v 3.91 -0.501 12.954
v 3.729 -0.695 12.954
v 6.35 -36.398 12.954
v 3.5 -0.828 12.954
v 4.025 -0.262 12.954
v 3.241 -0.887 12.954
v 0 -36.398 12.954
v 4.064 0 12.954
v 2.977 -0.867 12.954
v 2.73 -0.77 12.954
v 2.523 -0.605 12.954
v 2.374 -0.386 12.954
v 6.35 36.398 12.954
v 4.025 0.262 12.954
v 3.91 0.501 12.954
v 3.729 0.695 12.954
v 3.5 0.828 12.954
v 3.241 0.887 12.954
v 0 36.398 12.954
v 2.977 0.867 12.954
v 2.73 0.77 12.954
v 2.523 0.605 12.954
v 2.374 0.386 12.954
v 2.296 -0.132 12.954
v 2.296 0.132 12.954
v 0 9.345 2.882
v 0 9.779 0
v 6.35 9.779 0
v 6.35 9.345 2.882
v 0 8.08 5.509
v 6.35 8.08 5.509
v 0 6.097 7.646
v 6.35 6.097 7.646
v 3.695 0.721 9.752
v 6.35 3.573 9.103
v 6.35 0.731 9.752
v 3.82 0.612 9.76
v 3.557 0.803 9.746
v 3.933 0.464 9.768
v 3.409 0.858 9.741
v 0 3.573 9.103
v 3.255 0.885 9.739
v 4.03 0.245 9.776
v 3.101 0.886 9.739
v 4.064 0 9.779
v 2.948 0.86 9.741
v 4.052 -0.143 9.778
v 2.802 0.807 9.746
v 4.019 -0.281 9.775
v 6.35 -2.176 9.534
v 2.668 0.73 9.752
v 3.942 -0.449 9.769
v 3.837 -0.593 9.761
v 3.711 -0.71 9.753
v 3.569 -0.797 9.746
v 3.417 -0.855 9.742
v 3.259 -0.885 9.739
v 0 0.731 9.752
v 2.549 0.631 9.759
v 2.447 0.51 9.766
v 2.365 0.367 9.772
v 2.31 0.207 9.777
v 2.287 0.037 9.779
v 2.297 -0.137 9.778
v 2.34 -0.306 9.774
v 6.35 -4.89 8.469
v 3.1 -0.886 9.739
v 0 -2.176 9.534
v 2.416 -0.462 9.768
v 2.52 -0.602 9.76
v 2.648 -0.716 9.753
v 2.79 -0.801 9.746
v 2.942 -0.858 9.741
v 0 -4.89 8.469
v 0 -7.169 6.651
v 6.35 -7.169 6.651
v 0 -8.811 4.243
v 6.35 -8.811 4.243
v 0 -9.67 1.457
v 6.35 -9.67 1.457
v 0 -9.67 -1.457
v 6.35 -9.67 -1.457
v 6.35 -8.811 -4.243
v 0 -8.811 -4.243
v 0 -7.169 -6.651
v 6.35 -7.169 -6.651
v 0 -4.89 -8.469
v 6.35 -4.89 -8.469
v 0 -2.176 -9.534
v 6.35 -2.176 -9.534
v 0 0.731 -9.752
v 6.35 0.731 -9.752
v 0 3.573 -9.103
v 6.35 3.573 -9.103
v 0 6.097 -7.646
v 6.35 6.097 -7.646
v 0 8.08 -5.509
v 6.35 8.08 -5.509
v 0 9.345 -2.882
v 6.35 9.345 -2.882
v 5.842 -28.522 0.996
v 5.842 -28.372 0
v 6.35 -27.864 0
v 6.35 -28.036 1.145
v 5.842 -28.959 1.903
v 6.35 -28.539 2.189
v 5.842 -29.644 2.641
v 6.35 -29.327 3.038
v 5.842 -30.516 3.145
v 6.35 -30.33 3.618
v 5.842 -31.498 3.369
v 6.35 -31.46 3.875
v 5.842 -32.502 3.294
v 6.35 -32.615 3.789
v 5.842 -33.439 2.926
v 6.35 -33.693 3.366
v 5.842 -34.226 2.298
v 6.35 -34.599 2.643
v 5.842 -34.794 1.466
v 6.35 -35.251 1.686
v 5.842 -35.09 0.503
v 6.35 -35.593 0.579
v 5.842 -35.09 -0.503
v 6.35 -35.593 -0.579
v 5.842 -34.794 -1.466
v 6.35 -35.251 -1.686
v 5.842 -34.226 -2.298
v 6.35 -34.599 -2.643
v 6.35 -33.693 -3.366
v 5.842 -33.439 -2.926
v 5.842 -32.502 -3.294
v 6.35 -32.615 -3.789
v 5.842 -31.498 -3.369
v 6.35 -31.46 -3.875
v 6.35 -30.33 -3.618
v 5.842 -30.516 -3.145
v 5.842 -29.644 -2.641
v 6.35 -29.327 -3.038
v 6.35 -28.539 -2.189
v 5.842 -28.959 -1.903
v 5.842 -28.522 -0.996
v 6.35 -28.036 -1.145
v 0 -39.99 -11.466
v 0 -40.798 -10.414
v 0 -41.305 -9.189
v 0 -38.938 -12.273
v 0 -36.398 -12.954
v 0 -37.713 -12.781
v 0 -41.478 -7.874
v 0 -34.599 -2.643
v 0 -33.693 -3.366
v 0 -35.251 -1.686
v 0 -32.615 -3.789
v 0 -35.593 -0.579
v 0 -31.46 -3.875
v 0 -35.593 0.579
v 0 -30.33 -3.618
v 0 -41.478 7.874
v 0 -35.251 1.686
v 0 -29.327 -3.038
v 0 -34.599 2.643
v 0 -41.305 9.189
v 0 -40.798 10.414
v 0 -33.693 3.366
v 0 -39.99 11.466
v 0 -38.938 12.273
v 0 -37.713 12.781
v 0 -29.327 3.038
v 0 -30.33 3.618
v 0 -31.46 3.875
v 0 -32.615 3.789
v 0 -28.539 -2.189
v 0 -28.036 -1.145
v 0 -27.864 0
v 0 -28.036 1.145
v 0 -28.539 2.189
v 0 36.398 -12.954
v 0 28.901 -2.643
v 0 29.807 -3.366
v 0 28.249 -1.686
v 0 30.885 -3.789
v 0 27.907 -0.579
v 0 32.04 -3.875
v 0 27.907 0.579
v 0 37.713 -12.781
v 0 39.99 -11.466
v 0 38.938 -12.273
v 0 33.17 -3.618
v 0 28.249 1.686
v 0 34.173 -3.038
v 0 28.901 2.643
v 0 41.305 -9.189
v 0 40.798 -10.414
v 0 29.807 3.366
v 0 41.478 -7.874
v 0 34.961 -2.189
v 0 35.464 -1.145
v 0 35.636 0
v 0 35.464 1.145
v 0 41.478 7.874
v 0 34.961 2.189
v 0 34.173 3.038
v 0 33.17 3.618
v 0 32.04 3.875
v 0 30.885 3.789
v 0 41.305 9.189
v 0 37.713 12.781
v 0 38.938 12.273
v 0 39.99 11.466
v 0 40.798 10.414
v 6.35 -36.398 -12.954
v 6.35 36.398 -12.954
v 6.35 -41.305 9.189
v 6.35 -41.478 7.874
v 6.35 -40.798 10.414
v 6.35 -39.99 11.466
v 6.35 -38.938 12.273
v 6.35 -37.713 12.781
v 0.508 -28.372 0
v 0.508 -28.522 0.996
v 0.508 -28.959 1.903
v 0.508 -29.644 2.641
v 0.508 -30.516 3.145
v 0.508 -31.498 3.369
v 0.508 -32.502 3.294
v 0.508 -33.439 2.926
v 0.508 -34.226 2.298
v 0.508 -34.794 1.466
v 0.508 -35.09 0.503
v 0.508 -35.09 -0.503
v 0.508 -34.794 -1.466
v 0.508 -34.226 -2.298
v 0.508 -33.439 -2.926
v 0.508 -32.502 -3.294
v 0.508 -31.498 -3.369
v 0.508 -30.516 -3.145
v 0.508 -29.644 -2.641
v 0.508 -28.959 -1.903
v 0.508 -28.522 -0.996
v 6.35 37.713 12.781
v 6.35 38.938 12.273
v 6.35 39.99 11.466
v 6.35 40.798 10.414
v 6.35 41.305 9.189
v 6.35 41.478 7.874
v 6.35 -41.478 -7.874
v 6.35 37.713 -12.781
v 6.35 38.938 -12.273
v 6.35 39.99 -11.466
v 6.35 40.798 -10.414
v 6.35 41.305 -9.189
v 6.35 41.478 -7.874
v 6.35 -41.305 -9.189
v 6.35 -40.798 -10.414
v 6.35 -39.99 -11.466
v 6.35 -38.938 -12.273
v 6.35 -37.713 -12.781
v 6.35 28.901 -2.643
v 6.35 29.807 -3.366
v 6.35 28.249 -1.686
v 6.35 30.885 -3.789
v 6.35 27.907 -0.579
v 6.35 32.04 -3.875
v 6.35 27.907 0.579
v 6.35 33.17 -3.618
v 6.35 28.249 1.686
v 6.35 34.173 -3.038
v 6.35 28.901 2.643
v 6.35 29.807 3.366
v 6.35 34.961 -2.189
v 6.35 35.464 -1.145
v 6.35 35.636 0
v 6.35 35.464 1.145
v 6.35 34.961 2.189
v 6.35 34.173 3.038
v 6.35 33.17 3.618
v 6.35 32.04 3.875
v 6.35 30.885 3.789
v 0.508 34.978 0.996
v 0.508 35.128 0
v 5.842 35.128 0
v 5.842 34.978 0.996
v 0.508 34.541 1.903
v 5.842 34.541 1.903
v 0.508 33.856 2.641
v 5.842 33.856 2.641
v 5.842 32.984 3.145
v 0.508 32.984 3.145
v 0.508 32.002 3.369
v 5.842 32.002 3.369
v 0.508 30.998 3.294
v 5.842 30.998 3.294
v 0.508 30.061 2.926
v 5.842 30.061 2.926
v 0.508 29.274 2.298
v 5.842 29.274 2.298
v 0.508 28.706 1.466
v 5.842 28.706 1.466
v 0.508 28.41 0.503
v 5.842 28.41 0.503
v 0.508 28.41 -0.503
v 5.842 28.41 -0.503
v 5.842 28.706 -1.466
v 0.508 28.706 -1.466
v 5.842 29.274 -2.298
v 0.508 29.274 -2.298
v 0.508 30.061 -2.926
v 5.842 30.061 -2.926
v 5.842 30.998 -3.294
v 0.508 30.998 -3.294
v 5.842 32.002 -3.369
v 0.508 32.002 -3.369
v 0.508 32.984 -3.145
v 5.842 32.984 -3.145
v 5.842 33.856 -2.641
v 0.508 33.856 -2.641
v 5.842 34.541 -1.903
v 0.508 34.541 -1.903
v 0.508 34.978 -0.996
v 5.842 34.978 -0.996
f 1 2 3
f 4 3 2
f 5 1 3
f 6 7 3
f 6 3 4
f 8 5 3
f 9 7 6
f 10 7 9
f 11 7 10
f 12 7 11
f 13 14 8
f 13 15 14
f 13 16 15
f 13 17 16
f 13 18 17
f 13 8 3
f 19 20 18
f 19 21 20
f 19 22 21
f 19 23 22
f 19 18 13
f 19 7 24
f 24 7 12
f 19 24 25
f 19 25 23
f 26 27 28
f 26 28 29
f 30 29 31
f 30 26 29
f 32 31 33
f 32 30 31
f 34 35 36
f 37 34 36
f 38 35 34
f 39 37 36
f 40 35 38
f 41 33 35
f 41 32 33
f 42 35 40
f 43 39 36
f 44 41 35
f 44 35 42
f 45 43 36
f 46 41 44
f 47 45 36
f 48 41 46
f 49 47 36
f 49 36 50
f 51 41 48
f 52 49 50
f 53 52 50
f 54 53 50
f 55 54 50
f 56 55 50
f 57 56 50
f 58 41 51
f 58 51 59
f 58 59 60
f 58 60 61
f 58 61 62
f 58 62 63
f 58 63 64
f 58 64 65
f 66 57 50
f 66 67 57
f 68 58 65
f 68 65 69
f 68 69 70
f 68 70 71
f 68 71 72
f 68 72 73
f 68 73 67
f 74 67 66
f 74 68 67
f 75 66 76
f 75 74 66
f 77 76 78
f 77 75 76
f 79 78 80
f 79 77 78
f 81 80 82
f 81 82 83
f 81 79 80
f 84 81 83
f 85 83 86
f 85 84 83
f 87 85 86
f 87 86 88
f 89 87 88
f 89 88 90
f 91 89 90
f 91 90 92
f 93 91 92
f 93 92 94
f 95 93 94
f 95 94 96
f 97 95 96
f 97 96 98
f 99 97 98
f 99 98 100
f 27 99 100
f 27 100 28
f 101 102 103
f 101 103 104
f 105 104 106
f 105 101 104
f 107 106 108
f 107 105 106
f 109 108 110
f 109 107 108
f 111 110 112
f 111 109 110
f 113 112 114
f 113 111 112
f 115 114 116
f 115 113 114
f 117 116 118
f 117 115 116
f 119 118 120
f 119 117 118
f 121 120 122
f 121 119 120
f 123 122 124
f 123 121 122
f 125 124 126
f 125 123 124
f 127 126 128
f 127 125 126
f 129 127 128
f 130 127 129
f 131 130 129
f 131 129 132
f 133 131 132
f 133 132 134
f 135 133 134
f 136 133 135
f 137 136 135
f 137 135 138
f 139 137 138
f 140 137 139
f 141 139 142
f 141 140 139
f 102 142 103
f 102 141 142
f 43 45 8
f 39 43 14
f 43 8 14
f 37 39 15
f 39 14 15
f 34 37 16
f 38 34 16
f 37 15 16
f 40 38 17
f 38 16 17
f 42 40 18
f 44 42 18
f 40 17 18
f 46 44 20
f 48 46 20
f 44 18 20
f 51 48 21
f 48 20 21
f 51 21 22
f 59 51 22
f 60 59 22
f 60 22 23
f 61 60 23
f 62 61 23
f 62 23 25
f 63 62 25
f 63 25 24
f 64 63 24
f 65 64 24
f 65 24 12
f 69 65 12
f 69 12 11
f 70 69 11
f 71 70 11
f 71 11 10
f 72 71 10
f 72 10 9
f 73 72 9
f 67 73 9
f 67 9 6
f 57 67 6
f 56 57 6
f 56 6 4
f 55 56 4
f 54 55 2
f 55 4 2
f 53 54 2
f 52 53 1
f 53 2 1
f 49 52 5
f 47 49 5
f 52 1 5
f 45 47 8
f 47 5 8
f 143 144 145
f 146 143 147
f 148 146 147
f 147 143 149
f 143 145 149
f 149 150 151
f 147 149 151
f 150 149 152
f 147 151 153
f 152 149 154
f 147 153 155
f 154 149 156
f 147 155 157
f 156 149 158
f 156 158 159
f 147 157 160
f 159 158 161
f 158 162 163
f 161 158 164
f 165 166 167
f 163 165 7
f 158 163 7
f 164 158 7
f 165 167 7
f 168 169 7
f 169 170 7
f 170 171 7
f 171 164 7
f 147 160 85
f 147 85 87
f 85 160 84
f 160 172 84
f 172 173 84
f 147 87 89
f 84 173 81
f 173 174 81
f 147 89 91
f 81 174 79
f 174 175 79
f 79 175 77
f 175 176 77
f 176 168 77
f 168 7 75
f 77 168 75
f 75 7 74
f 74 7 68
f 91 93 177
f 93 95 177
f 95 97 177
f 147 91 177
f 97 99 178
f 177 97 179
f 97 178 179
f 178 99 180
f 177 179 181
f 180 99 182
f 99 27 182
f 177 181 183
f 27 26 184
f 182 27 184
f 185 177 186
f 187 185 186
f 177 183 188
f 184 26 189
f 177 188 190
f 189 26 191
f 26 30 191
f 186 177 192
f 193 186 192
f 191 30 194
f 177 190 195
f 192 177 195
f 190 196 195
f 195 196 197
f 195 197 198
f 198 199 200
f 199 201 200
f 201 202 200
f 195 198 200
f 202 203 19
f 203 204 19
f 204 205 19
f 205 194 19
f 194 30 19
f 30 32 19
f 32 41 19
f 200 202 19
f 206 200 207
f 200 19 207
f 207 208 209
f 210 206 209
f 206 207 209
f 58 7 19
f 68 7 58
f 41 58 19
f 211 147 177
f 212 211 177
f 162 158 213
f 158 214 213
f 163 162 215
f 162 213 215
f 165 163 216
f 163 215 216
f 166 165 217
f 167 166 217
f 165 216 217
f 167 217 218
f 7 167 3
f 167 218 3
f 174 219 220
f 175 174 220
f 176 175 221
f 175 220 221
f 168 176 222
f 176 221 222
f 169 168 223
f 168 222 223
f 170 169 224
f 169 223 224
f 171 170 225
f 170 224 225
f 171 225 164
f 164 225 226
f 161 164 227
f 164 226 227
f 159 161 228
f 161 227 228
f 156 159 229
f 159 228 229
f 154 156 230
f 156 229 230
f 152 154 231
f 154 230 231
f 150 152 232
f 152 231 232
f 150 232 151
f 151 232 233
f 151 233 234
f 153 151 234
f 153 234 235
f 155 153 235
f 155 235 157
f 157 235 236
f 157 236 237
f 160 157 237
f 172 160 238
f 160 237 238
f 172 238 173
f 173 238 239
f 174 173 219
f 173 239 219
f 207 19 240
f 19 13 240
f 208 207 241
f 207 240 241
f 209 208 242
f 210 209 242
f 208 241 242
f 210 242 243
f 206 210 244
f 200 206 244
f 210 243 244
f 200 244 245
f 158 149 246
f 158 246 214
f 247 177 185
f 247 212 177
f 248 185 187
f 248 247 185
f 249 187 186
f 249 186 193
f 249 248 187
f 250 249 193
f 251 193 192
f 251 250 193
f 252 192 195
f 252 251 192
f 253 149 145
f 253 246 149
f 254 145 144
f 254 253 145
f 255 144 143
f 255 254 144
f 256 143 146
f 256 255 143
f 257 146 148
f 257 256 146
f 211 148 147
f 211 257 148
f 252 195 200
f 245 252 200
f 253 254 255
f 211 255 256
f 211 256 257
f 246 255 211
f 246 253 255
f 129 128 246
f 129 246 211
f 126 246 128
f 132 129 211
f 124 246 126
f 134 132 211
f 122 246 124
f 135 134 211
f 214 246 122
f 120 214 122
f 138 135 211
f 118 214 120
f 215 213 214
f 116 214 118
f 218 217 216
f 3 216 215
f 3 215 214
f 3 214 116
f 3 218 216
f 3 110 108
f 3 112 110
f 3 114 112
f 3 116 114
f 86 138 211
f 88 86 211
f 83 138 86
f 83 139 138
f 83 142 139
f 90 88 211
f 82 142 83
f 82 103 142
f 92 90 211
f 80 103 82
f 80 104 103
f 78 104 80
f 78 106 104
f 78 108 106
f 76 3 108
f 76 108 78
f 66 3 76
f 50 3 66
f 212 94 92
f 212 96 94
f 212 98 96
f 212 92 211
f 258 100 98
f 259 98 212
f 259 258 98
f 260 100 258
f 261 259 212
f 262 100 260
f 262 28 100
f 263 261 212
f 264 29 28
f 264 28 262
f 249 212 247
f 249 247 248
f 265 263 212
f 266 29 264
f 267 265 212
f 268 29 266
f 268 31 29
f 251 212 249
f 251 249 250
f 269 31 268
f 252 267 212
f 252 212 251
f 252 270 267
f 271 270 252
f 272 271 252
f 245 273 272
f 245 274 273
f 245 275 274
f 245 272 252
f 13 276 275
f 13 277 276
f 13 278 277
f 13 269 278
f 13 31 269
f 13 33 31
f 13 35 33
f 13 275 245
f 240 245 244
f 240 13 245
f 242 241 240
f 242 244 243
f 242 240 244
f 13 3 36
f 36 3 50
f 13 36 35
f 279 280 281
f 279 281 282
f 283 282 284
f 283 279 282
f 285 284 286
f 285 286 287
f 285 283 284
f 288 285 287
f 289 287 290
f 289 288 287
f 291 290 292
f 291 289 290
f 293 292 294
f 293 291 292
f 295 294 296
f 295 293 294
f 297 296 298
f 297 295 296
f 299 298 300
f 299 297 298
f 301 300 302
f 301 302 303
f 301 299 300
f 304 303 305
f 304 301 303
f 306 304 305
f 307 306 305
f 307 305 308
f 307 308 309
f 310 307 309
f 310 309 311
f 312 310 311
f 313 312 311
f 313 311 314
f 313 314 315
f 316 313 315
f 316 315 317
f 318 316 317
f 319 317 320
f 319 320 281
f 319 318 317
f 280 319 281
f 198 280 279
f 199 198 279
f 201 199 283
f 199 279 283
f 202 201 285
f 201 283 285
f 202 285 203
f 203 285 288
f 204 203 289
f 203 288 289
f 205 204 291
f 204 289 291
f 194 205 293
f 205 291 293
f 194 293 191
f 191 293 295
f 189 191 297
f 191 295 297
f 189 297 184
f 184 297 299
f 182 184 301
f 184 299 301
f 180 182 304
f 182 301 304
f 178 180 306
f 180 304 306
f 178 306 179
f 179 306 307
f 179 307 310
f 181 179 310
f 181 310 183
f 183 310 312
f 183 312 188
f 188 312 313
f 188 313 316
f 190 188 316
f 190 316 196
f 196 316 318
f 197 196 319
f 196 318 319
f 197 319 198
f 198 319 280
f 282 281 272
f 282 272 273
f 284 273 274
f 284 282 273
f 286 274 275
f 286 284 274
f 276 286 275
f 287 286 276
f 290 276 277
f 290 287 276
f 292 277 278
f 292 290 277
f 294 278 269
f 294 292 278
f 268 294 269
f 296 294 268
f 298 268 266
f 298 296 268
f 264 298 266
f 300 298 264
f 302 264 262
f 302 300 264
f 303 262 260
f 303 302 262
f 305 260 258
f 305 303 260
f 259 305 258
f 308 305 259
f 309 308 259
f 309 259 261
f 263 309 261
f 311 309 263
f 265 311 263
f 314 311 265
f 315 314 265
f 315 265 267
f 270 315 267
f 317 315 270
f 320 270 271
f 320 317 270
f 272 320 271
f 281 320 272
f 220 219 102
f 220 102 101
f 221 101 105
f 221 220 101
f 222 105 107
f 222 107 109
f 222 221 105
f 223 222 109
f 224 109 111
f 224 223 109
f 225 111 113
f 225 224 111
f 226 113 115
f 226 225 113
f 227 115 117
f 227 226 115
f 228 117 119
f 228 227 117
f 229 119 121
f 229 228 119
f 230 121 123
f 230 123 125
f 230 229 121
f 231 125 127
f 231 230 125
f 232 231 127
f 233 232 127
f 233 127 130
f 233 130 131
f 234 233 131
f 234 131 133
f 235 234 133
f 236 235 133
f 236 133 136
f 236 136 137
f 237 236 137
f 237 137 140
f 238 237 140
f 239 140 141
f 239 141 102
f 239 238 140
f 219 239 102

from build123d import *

# Parameters (mm, degrees)
F0_W     = 82.9564
F0_H     = 25.908
F0_R     = 3.3782
F0_R_2   = 9.779
F1_DEPTH = 6.35
F3_R     = 5.08
F4_SIZE  = 0.508
F2_R     = 0.889
F5_DEPTH = 3.2164930276


with BuildPart() as f1:
    # F0 (on Right) → F1 (new body)
    with BuildSketch(Plane.YZ):
        Rectangle(F0_W, F0_H)
        with Locations((-31.75, 0)):
            Circle(F0_R, mode=Mode.SUBTRACT)
        Circle(F0_R_2, mode=Mode.SUBTRACT)
        with Locations((31.75, 0)):
            Circle(F0_R, mode=Mode.SUBTRACT)
    extrude(amount=F1_DEPTH)

    # F3
    f3_edges = [f1.edges().sort_by_distance(p)[0] for p in [
        (3.175, -41.4782, 12.954),
        (3.175, 41.4782, 12.954),
        (3.175, 41.4782, -12.954),
        (3.175, -41.4782, -12.954),
    ]]
    fillet(f3_edges, radius=F3_R)

    # F4
    f4_edges = [f1.edges().sort_by_distance(p)[0] for p in [
        (0, 28.3718, 0),
        (6.35, 28.3718, 0),
        (0, -35.1282, 0),
        (6.35, -35.1282, 0),
    ]]
    chamfer(f4_edges, length=F4_SIZE)

    # F2 (on face) → F5 (cut, through all)
    with BuildSketch(Plane.XY.offset(12.954)):
        with Locations((3.175, 0)):
            Circle(F2_R)
    extrude(amount=-F5_DEPTH, mode=Mode.SUBTRACT)


solid = f1.part
